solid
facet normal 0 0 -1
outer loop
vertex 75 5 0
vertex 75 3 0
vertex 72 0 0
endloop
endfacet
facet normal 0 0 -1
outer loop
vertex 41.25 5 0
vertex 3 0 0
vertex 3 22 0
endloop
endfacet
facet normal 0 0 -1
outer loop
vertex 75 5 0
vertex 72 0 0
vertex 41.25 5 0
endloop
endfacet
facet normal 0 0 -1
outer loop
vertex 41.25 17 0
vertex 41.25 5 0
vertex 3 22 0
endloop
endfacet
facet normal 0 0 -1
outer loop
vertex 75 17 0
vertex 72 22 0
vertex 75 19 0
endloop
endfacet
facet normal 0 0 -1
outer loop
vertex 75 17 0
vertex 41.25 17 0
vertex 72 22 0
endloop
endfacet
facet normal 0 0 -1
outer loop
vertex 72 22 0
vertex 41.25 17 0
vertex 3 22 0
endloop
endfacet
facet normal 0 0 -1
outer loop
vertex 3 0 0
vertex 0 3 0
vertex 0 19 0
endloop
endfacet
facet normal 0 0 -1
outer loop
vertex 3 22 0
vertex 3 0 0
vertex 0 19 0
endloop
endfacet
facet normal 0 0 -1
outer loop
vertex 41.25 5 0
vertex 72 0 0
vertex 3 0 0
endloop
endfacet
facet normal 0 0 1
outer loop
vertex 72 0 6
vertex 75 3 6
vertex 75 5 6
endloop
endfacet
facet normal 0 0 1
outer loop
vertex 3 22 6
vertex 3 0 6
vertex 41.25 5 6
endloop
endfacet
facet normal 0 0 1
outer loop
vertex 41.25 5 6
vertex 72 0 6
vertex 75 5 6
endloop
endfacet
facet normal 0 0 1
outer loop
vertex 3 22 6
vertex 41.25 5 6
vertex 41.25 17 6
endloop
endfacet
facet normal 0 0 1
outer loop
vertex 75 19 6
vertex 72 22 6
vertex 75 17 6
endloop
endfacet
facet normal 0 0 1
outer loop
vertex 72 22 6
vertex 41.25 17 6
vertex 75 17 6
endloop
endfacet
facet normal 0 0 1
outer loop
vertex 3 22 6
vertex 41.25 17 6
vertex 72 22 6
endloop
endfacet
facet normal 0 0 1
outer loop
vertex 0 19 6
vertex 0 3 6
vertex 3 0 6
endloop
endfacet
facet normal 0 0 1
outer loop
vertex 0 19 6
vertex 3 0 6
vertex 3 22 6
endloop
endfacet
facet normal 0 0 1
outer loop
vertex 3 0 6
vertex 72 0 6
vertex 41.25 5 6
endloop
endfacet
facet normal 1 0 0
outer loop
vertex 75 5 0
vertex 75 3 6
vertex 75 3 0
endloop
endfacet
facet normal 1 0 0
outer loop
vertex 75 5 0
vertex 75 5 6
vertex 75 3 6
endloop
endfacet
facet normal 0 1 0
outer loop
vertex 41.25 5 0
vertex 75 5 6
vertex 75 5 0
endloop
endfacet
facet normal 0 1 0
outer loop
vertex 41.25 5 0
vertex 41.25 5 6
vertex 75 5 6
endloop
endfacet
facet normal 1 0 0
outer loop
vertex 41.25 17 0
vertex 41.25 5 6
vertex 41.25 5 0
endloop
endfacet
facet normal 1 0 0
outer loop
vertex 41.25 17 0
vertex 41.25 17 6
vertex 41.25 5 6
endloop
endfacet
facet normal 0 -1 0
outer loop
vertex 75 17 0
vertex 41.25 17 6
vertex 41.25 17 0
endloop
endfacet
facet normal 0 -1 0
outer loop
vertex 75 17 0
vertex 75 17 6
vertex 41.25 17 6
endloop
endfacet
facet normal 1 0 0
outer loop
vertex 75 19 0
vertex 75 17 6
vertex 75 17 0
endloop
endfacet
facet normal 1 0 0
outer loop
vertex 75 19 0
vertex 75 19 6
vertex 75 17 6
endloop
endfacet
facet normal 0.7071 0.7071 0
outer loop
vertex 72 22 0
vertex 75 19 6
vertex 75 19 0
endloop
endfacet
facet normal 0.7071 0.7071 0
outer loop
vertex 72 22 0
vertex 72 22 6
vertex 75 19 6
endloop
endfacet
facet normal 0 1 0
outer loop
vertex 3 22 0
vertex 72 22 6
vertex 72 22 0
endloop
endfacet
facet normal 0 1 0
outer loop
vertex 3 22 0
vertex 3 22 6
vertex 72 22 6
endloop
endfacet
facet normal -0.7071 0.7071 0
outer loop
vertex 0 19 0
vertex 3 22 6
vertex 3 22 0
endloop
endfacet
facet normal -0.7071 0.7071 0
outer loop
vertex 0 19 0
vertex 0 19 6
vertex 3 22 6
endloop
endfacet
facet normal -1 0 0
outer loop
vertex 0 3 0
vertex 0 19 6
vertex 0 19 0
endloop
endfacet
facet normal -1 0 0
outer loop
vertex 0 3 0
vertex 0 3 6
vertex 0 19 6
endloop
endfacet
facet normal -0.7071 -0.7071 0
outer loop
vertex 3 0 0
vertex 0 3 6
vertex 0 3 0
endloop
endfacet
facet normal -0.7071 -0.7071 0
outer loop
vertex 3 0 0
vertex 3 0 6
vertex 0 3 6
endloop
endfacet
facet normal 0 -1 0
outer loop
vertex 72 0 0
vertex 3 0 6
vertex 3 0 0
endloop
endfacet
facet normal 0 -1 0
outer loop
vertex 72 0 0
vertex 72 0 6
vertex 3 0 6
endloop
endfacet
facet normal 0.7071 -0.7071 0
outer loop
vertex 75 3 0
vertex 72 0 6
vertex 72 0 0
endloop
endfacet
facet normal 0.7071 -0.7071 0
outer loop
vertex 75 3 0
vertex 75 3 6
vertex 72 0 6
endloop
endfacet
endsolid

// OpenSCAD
$fn = 32;

// ----------------------------------------------------------------------
// C washer: 75 x 22 mm plate with an open slot
// ----------------------------------------------------------------------

// --- parameters (mm) ---
profile_height = 6;       // extrusion height
profile_points = 12;      // points of the closed outline

profile = [[3, 0], [72, 0], [75, 3], [75, 5], [41.25, 5], [41.25, 17], [75, 17], [75, 19], [72, 22], [3, 22], [0, 19], [0, 3]];  // single closed polygon, 12 points, counter clockwise

// --- the one profile operation ---
linear_extrude(height = profile_height) polygon(points = profile);
